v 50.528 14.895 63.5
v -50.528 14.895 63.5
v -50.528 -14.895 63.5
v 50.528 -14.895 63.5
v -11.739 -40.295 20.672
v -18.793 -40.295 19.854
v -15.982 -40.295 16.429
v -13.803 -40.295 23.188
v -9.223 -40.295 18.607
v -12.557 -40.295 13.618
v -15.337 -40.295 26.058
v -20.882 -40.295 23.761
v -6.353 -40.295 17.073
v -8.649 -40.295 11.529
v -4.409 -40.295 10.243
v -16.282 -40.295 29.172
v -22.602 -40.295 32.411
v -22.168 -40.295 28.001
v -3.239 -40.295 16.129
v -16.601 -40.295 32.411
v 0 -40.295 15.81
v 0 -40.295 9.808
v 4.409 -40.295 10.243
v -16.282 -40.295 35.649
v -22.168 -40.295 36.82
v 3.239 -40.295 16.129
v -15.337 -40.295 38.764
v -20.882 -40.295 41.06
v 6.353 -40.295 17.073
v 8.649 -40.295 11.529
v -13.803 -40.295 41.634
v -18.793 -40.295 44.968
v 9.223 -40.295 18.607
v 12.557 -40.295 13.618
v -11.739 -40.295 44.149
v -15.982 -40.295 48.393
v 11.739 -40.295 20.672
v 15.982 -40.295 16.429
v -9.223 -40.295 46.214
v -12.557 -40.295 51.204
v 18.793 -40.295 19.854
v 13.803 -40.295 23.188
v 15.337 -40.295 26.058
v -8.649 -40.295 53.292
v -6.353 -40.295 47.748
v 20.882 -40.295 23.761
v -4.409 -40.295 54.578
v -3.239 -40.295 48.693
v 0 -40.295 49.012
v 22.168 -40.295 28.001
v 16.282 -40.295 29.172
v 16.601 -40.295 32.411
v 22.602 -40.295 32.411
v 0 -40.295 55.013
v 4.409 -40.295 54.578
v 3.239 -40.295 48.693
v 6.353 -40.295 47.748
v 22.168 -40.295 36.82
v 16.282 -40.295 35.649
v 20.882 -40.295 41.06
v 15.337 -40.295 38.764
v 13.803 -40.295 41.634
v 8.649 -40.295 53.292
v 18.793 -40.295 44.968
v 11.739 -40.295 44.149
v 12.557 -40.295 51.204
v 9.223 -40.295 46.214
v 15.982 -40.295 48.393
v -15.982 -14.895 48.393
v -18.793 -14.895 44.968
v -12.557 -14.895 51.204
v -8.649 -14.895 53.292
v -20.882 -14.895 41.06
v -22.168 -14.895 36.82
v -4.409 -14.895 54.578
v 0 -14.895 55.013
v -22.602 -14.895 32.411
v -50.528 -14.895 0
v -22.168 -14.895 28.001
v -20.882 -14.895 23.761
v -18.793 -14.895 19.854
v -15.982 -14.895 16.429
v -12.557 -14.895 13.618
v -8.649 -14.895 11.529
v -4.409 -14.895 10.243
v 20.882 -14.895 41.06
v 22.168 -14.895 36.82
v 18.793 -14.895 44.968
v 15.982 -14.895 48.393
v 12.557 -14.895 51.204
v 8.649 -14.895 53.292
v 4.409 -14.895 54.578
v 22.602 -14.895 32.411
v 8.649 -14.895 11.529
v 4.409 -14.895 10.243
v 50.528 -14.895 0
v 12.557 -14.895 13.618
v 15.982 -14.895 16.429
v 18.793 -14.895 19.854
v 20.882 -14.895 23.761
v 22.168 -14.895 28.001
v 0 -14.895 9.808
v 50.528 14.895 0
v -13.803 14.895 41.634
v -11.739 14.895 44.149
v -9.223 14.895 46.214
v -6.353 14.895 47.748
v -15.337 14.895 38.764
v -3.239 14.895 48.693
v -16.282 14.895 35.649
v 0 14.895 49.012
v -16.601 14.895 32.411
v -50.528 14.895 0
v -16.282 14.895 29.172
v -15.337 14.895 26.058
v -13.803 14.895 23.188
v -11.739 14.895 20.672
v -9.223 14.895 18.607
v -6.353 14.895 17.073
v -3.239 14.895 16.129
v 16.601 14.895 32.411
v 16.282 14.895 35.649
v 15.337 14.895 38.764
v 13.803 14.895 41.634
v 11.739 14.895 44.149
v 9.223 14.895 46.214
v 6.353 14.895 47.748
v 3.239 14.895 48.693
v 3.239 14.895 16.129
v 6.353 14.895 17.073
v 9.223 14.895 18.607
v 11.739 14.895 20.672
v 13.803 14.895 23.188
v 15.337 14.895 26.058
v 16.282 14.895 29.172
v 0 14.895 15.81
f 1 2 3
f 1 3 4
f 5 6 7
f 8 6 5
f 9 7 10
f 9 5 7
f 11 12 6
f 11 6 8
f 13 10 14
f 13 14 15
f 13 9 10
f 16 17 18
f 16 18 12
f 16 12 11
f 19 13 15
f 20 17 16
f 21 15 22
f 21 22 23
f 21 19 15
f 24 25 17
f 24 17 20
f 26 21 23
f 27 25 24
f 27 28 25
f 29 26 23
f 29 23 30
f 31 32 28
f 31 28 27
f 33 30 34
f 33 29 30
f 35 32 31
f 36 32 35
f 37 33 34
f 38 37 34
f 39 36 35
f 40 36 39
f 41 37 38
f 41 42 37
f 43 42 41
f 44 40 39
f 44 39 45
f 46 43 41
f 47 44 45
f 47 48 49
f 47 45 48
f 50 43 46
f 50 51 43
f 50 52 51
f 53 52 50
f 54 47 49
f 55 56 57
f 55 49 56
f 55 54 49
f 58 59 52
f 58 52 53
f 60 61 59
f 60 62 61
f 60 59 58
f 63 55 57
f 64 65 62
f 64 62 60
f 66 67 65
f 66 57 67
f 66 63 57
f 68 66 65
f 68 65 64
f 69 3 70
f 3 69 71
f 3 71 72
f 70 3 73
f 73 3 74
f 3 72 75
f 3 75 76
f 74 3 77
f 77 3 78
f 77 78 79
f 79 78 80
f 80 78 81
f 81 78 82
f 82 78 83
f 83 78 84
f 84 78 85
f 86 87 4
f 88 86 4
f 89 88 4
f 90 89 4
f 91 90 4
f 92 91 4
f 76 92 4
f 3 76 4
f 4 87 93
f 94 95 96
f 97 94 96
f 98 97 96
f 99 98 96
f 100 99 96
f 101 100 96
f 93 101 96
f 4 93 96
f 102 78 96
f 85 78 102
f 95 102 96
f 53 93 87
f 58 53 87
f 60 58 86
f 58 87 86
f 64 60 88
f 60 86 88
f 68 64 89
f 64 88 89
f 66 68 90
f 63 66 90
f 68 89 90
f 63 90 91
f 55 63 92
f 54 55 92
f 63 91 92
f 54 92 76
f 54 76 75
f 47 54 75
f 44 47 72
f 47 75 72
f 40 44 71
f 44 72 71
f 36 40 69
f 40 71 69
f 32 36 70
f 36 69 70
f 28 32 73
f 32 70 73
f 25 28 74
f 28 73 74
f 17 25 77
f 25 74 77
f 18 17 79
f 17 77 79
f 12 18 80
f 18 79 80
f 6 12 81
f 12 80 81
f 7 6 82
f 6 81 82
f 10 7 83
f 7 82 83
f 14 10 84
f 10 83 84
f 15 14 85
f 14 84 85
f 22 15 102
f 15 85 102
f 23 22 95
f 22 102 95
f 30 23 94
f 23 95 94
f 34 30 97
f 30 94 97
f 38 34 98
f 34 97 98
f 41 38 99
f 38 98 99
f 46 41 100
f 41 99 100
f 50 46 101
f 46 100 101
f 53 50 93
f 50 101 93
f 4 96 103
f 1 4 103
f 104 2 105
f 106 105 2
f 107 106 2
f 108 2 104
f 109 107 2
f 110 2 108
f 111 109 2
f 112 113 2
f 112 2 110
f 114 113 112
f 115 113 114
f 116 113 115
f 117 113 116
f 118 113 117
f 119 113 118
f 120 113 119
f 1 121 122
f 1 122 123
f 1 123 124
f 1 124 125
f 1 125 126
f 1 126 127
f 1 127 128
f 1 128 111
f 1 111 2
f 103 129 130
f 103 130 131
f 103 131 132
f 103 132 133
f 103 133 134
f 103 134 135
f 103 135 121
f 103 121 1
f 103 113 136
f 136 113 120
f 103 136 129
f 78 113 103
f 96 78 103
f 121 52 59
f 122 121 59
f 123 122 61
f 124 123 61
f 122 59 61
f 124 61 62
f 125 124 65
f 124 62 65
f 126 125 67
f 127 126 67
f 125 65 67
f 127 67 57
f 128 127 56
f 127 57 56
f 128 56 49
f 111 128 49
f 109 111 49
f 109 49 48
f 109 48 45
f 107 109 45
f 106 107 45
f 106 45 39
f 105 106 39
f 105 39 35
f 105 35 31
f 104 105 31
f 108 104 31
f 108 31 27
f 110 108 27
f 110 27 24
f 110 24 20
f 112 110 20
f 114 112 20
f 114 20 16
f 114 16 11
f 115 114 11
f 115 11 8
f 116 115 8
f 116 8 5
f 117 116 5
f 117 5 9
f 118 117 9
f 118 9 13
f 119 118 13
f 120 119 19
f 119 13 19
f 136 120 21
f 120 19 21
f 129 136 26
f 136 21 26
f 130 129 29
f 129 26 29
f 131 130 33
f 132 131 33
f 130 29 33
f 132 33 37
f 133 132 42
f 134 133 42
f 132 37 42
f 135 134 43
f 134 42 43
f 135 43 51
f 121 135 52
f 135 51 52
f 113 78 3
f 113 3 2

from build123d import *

# Parameters (mm, degrees)
F0_W     = 101.05566
F0_H     = 29.790164
F1_DEPTH = 63.5
F2_R     = 22.602142
F3_DEPTH = 25.4
F4_R     = 16.601085
F5_DEPTH = 55.191165


with BuildPart() as f1:
    # F0 (on Top) → F1 (new body)
    with BuildSketch(Plane.XY):
        Rectangle(F0_W, F0_H)
    extrude(amount=F1_DEPTH)

    # F2 (on face) → F3 (join)
    with BuildSketch(Plane.XZ.offset(14.895082)):
        with Locations((0, 32.410629)):
            Circle(F2_R)
    extrude(amount=F3_DEPTH)

    # F4 (on face) → F5 (cut, through all)
    with BuildSketch(Plane.XZ.offset(40.295082)):
        with Locations((0, 32.410629)):
            Circle(F4_R)
    extrude(amount=-F5_DEPTH, mode=Mode.SUBTRACT)


solid = f1.part
